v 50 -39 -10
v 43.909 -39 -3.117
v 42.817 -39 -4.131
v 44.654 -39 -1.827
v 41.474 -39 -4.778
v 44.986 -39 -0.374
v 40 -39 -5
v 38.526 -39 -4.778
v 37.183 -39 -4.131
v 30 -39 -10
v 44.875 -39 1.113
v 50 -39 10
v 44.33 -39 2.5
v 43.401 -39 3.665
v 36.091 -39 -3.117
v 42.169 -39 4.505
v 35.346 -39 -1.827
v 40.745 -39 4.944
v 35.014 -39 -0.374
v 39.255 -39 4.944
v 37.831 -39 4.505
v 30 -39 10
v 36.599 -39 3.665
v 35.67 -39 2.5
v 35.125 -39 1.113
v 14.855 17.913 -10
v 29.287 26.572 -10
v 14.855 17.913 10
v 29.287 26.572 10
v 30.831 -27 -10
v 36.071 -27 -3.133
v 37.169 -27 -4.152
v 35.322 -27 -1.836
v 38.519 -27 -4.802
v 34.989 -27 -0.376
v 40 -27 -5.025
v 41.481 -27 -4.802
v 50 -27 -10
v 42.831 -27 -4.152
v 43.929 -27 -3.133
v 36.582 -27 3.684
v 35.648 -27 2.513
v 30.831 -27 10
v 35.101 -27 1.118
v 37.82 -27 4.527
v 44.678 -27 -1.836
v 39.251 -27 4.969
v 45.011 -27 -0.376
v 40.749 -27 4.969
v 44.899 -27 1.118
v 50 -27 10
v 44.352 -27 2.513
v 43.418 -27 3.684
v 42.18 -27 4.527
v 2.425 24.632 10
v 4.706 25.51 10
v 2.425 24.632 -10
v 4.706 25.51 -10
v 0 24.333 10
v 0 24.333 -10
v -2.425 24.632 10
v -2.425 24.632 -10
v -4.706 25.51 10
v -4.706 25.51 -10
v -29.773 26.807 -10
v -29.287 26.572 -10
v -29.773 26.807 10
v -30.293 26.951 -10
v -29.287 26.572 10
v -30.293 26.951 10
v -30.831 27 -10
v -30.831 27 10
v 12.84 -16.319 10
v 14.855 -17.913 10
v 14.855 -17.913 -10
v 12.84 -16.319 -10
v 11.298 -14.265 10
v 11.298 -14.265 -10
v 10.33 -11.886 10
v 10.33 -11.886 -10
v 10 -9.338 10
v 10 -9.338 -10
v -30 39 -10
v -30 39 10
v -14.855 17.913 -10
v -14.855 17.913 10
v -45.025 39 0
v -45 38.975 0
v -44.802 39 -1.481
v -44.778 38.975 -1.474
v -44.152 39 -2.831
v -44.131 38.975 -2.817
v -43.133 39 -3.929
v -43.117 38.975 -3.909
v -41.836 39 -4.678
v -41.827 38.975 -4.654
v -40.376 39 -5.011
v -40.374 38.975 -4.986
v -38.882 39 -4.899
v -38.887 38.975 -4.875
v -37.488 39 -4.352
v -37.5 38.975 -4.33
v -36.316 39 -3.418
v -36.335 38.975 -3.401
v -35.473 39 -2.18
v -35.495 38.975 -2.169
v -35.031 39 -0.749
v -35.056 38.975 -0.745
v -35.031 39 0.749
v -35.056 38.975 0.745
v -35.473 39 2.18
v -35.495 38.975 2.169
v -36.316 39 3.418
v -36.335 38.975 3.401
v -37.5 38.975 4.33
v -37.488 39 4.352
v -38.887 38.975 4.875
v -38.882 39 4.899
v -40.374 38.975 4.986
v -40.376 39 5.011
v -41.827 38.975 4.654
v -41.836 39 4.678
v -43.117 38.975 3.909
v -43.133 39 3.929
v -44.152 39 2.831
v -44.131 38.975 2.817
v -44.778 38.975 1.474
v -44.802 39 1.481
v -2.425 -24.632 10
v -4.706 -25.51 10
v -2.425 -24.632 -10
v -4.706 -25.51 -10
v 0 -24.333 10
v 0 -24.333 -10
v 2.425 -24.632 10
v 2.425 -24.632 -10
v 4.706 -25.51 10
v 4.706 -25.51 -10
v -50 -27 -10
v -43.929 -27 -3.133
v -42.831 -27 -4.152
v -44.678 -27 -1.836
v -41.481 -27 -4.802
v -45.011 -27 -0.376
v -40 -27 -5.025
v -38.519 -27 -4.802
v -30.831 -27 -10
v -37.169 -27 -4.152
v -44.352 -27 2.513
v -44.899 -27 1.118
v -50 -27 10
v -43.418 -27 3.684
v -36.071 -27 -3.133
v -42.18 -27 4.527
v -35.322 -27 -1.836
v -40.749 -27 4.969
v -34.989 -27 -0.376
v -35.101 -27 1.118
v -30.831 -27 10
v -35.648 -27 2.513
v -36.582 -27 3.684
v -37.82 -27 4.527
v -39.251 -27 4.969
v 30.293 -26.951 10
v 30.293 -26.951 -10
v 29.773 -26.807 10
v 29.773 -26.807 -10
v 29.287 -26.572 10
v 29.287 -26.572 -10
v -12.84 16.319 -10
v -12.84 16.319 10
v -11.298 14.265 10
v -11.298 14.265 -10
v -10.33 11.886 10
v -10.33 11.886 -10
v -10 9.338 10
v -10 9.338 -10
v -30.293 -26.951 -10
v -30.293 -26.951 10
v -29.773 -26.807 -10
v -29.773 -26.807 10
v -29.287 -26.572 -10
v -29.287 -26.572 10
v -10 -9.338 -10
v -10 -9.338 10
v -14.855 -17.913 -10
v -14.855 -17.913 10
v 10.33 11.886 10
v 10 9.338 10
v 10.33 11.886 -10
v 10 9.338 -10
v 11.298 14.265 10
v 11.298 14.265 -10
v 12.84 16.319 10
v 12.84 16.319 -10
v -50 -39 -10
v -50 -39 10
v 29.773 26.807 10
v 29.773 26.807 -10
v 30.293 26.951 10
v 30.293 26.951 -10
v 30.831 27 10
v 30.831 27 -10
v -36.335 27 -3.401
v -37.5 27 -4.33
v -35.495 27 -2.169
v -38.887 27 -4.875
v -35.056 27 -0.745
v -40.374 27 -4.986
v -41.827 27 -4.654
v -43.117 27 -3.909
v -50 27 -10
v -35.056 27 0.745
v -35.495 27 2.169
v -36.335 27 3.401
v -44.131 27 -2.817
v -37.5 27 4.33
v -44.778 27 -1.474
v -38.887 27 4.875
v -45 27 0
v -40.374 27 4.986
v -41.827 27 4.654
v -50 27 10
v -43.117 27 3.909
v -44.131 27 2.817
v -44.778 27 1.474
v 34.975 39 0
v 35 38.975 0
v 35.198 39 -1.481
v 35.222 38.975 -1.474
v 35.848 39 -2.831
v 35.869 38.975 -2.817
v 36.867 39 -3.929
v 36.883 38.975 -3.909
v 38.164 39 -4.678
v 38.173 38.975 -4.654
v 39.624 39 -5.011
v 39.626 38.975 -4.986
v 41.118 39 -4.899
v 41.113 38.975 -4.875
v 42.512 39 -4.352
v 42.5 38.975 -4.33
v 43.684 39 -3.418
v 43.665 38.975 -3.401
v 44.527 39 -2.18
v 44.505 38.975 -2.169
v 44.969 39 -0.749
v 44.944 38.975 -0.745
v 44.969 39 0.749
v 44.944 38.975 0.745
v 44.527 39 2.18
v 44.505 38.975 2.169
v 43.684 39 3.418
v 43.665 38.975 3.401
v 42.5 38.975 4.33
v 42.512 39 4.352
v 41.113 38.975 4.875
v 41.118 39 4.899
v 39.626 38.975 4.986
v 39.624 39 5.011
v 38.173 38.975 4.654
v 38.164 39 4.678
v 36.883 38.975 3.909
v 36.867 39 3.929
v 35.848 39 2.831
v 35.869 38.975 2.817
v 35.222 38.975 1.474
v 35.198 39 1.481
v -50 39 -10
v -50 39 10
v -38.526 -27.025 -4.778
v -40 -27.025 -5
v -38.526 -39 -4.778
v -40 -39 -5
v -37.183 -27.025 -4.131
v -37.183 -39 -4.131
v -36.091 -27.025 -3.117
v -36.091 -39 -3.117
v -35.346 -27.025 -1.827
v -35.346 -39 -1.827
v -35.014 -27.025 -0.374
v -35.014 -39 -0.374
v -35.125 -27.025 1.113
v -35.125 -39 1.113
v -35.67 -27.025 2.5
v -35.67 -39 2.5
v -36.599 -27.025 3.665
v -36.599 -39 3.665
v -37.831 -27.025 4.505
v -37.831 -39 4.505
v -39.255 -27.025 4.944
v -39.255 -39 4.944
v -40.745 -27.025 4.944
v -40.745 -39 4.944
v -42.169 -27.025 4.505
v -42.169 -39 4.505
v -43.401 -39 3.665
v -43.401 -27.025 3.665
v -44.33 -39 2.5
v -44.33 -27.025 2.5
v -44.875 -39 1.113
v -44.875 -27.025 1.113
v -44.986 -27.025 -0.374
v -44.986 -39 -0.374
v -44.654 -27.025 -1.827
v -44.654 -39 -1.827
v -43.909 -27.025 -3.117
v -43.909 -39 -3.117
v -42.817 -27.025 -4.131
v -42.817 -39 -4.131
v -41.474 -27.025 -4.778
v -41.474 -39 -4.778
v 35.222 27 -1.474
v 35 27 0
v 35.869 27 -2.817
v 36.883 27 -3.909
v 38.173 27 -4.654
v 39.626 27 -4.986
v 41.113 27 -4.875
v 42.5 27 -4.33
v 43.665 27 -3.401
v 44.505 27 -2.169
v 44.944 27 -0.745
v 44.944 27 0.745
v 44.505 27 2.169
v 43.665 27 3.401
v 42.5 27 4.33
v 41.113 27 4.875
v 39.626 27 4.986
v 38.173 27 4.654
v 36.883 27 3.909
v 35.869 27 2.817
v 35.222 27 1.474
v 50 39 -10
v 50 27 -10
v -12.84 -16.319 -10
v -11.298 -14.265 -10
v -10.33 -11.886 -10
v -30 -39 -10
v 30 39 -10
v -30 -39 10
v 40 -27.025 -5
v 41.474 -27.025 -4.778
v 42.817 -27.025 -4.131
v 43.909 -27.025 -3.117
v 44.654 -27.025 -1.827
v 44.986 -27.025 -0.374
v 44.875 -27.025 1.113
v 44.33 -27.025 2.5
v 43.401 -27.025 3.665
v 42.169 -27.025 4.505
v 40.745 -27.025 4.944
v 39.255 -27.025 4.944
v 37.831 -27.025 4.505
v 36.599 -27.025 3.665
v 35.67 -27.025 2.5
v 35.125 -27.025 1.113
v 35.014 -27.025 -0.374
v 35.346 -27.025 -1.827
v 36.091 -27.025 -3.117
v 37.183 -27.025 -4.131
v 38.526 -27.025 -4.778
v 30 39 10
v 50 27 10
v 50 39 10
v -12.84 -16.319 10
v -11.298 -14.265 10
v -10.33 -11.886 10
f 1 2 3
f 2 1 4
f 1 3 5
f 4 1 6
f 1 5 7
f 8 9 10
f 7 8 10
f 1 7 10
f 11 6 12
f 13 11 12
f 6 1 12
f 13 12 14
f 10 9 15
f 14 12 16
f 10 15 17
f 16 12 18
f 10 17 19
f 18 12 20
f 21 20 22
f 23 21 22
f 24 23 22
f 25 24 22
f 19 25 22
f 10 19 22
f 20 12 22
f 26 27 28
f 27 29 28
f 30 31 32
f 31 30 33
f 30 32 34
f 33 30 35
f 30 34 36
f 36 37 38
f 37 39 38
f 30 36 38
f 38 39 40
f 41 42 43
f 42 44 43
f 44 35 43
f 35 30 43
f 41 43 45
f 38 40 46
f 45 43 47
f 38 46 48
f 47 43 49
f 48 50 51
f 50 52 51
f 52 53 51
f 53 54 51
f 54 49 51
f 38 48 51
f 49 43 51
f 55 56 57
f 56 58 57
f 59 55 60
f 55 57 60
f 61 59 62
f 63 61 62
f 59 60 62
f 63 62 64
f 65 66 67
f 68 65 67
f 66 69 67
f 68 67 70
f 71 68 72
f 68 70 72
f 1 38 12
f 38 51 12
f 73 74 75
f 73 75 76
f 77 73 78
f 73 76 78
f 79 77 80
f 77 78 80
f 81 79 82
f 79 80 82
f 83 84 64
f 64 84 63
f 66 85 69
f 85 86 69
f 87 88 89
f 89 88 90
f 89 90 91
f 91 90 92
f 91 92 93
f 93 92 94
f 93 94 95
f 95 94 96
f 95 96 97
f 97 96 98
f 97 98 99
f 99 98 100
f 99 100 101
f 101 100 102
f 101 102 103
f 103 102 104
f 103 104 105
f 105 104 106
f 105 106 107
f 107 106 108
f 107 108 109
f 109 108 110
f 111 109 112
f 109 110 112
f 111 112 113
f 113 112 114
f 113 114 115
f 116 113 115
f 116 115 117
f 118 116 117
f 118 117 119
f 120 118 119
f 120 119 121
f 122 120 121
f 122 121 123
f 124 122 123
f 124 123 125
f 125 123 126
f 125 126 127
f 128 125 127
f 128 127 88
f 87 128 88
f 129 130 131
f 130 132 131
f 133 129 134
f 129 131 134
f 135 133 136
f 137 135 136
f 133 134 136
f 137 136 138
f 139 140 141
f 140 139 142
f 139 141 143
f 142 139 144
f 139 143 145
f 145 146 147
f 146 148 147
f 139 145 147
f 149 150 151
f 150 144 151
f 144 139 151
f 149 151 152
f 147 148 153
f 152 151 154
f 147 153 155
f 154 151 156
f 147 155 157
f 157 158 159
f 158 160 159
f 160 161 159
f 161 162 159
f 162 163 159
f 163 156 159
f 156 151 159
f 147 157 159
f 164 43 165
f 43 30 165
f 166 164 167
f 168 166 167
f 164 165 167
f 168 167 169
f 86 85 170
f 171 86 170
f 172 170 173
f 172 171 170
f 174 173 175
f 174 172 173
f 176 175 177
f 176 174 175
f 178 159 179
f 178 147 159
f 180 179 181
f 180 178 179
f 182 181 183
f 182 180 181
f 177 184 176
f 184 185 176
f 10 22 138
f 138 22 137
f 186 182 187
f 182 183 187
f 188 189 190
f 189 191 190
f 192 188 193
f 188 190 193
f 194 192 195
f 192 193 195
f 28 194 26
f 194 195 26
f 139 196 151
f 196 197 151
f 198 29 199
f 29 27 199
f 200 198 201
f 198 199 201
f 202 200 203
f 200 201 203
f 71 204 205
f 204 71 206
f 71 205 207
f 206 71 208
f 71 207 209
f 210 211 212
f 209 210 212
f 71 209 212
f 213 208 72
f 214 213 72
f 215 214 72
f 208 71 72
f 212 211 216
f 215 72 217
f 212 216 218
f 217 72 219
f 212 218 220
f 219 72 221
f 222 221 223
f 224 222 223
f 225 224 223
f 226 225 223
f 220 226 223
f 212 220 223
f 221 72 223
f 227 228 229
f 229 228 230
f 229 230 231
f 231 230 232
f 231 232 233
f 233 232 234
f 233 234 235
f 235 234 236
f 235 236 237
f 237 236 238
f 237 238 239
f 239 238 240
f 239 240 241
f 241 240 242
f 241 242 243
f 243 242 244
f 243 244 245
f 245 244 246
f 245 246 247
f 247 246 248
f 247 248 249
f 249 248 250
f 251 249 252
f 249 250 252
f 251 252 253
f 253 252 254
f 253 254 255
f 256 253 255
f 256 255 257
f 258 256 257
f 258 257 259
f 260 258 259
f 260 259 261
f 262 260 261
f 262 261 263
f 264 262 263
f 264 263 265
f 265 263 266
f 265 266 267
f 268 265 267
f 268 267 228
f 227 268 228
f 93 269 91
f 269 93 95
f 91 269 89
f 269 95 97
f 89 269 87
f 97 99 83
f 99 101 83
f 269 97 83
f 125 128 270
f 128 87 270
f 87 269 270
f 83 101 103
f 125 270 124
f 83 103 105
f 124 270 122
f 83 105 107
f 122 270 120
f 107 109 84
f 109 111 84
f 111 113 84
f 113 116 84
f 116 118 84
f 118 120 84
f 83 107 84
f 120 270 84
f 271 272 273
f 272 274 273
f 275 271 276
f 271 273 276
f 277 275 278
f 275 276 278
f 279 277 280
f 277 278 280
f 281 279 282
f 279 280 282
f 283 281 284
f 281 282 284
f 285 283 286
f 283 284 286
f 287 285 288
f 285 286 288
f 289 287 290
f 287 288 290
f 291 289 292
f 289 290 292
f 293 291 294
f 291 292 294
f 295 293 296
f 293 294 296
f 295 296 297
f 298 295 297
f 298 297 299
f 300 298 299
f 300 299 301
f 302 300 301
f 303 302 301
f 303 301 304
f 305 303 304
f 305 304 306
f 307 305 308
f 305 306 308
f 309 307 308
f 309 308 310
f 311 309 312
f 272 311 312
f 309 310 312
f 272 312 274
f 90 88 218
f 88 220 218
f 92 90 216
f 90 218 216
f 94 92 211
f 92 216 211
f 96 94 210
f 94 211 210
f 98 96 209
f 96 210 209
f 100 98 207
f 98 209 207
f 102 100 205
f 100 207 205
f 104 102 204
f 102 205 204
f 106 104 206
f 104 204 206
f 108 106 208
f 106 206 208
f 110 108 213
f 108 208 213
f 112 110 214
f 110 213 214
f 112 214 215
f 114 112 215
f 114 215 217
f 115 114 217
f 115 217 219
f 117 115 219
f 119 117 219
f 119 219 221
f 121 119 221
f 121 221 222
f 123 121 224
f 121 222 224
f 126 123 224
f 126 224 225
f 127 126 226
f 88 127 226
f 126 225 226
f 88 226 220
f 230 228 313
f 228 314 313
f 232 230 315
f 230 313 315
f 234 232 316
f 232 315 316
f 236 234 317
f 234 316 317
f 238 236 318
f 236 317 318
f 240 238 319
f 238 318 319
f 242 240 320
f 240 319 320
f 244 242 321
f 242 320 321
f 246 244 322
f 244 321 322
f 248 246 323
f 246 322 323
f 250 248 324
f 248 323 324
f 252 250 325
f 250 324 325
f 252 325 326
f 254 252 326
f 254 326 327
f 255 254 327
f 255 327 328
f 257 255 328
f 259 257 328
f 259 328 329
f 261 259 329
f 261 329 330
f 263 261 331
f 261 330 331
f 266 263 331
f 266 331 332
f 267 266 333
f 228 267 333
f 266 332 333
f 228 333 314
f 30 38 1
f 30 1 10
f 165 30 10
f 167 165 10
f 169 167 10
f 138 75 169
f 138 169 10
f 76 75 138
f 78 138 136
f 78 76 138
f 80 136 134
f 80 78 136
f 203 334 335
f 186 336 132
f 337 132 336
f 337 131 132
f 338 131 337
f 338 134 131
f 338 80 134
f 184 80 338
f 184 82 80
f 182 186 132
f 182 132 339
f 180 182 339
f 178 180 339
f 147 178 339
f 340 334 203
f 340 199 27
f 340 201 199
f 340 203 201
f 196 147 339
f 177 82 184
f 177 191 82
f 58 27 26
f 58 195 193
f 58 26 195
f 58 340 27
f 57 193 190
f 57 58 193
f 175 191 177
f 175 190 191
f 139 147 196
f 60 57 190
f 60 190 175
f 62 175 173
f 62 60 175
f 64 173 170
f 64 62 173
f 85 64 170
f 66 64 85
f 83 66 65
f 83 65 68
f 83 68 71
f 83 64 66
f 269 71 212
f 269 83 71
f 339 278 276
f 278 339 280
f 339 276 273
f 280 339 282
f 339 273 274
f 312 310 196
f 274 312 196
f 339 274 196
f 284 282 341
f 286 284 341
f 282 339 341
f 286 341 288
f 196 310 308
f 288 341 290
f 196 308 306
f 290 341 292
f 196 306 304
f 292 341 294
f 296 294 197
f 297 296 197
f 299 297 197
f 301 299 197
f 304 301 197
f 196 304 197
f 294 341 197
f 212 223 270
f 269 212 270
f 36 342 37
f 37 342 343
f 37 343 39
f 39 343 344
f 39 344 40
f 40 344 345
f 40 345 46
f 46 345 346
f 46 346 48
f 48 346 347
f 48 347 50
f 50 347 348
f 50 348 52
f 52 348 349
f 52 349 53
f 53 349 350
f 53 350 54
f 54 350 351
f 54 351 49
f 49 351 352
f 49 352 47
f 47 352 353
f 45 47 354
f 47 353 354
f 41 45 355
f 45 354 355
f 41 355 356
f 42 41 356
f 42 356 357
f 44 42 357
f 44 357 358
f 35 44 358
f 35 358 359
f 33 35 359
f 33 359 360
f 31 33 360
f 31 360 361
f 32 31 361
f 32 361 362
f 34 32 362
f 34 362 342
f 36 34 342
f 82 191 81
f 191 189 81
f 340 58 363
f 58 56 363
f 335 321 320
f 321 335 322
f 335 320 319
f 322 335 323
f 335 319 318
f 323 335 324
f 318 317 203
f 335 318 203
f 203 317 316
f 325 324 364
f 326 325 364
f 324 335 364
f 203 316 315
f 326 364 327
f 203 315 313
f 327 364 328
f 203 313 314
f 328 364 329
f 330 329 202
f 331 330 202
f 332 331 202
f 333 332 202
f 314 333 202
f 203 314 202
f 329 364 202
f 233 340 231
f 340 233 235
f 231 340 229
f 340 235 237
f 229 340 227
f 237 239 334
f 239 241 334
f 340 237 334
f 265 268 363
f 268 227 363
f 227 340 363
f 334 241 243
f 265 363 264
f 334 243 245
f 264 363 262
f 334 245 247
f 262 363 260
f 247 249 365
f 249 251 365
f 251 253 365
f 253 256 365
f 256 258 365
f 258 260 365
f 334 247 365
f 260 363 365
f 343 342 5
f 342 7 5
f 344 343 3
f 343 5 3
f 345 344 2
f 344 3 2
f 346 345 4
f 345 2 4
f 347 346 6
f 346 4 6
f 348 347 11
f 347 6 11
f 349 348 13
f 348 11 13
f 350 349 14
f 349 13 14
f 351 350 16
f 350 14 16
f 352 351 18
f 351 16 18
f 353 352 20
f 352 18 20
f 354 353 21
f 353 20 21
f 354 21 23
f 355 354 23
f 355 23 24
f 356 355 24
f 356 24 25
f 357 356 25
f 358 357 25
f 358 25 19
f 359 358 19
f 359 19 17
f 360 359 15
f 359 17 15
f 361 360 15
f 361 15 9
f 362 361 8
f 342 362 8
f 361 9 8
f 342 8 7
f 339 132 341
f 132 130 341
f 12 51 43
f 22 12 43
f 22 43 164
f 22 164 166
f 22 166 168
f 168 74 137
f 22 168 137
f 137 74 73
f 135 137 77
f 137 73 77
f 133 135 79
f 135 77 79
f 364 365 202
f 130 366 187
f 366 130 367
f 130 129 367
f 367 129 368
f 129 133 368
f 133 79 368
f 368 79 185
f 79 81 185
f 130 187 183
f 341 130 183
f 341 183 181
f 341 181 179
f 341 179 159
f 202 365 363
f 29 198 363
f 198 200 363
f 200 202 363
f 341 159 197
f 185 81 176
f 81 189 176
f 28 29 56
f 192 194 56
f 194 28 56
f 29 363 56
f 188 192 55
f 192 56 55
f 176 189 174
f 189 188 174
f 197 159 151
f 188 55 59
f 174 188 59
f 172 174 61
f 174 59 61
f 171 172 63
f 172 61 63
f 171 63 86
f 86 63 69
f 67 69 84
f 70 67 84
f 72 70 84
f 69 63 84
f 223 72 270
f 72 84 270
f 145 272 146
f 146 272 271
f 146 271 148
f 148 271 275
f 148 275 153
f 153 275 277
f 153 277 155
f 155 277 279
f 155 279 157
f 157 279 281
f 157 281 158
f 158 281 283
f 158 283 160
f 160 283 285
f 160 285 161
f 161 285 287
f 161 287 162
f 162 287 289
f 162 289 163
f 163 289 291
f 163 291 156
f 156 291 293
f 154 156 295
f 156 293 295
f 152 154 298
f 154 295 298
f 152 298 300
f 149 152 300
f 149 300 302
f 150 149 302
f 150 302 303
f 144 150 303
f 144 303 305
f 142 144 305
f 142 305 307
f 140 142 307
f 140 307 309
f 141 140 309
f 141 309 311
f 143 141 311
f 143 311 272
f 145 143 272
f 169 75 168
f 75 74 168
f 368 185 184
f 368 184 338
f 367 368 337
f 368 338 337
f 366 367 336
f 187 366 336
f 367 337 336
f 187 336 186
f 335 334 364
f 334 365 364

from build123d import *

# Parameters (mm, degrees)
BOSS_EXTRUDE1_DEPTH                        = 10
FILLET1_R                                  = 10
F_10_0MM_DOWEL_HOLE1_D                     = 10
F_10_0MM_DOWEL_HOLE1_DEPTH                 = 24.5
F_10_0MM_DOWEL_HOLE1_CSINK_D               = 10.05
F_10_0MM_DOWEL_HOLE1_CSINK_ANGLE           = 90
F_10_0MM_DOWEL_HOLE1_TIP                   = 3.004303095
F_10_0MM_DOWEL_HOLE1_ON_FACE_2_D           = 10
F_10_0MM_DOWEL_HOLE1_ON_FACE_2_DEPTH       = 24.5
F_10_0MM_DOWEL_HOLE1_ON_FACE_2_CSINK_D     = 10.05
F_10_0MM_DOWEL_HOLE1_ON_FACE_2_CSINK_ANGLE = 90
F_10_0MM_DOWEL_HOLE1_ON_FACE_2_TIP         = 3.004303095
FILLET2_R                                  = 3


with BuildPart() as part:
    # Sketch1 → Boss-Extrude1 (new, symmetric)
    with BuildSketch(Plane.XY):
        Polygon((-50, 27), (-50, 39), (-30, 39), (0, 23), (30, 39), (50, 39), (50, 27), (30, 27), (10, 15), (10, -15), (30, -27), (50, -27), (50, -39), (30, -39), (0, -23), (-30, -39), (-50, -39), (-50, -27), (-30, -27), (-10, -15), (-10, 15), (-30, 27), align=None)
    extrude(amount=BOSS_EXTRUDE1_DEPTH, both=True)

    # Fillet1
    fillet1_edges = [part.edges().sort_by_distance(p)[0] for p in [
        (-10, 15, 0),
        (0, 23, 0),
        (10, 15, 0),
        (10, -15, 0),
        (0, -23, 0),
        (-10, -15, 0),
    ]]
    fillet(fillet1_edges, radius=FILLET1_R)

    # Ø10.0mm Dowel Hole1
    with Locations(Plane(origin=(-40, 39, 0), x_dir=(1, 0, 0), z_dir=(0, 1, 0))):
        with Locations((0, 0), (80, 0)):
            CounterSinkHole(F_10_0MM_DOWEL_HOLE1_D / 2, F_10_0MM_DOWEL_HOLE1_CSINK_D / 2, depth=F_10_0MM_DOWEL_HOLE1_DEPTH, counter_sink_angle=F_10_0MM_DOWEL_HOLE1_CSINK_ANGLE)
            with Locations((0, 0, -(F_10_0MM_DOWEL_HOLE1_DEPTH + F_10_0MM_DOWEL_HOLE1_TIP / 2))):  # 118° drill point
                Cone(0, F_10_0MM_DOWEL_HOLE1_D / 2, F_10_0MM_DOWEL_HOLE1_TIP, mode=Mode.SUBTRACT)

    # Ø10.0mm Dowel Hole1 on face 2
    with Locations(Plane(origin=(-40, -27, 0), x_dir=(0, 0, 1), z_dir=(0, 1, 0))):
        with Locations((0, 0), (0, 80)):
            CounterSinkHole(F_10_0MM_DOWEL_HOLE1_ON_FACE_2_D / 2, F_10_0MM_DOWEL_HOLE1_ON_FACE_2_CSINK_D / 2, depth=F_10_0MM_DOWEL_HOLE1_ON_FACE_2_DEPTH, counter_sink_angle=F_10_0MM_DOWEL_HOLE1_ON_FACE_2_CSINK_ANGLE)
            with Locations((0, 0, -(F_10_0MM_DOWEL_HOLE1_ON_FACE_2_DEPTH + F_10_0MM_DOWEL_HOLE1_ON_FACE_2_TIP / 2))):  # 118° drill point
                Cone(0, F_10_0MM_DOWEL_HOLE1_ON_FACE_2_D / 2, F_10_0MM_DOWEL_HOLE1_ON_FACE_2_TIP, mode=Mode.SUBTRACT)

    # Fillet2
    fillet2_edges = [part.edges().sort_by_distance(p)[0] for p in [
        (-30, 27, 0),
        (30, 27, 0),
        (30, -27, 0),
        (-30, -27, 0),
    ]]
    fillet(fillet2_edges, radius=FILLET2_R)


solid = part.part
